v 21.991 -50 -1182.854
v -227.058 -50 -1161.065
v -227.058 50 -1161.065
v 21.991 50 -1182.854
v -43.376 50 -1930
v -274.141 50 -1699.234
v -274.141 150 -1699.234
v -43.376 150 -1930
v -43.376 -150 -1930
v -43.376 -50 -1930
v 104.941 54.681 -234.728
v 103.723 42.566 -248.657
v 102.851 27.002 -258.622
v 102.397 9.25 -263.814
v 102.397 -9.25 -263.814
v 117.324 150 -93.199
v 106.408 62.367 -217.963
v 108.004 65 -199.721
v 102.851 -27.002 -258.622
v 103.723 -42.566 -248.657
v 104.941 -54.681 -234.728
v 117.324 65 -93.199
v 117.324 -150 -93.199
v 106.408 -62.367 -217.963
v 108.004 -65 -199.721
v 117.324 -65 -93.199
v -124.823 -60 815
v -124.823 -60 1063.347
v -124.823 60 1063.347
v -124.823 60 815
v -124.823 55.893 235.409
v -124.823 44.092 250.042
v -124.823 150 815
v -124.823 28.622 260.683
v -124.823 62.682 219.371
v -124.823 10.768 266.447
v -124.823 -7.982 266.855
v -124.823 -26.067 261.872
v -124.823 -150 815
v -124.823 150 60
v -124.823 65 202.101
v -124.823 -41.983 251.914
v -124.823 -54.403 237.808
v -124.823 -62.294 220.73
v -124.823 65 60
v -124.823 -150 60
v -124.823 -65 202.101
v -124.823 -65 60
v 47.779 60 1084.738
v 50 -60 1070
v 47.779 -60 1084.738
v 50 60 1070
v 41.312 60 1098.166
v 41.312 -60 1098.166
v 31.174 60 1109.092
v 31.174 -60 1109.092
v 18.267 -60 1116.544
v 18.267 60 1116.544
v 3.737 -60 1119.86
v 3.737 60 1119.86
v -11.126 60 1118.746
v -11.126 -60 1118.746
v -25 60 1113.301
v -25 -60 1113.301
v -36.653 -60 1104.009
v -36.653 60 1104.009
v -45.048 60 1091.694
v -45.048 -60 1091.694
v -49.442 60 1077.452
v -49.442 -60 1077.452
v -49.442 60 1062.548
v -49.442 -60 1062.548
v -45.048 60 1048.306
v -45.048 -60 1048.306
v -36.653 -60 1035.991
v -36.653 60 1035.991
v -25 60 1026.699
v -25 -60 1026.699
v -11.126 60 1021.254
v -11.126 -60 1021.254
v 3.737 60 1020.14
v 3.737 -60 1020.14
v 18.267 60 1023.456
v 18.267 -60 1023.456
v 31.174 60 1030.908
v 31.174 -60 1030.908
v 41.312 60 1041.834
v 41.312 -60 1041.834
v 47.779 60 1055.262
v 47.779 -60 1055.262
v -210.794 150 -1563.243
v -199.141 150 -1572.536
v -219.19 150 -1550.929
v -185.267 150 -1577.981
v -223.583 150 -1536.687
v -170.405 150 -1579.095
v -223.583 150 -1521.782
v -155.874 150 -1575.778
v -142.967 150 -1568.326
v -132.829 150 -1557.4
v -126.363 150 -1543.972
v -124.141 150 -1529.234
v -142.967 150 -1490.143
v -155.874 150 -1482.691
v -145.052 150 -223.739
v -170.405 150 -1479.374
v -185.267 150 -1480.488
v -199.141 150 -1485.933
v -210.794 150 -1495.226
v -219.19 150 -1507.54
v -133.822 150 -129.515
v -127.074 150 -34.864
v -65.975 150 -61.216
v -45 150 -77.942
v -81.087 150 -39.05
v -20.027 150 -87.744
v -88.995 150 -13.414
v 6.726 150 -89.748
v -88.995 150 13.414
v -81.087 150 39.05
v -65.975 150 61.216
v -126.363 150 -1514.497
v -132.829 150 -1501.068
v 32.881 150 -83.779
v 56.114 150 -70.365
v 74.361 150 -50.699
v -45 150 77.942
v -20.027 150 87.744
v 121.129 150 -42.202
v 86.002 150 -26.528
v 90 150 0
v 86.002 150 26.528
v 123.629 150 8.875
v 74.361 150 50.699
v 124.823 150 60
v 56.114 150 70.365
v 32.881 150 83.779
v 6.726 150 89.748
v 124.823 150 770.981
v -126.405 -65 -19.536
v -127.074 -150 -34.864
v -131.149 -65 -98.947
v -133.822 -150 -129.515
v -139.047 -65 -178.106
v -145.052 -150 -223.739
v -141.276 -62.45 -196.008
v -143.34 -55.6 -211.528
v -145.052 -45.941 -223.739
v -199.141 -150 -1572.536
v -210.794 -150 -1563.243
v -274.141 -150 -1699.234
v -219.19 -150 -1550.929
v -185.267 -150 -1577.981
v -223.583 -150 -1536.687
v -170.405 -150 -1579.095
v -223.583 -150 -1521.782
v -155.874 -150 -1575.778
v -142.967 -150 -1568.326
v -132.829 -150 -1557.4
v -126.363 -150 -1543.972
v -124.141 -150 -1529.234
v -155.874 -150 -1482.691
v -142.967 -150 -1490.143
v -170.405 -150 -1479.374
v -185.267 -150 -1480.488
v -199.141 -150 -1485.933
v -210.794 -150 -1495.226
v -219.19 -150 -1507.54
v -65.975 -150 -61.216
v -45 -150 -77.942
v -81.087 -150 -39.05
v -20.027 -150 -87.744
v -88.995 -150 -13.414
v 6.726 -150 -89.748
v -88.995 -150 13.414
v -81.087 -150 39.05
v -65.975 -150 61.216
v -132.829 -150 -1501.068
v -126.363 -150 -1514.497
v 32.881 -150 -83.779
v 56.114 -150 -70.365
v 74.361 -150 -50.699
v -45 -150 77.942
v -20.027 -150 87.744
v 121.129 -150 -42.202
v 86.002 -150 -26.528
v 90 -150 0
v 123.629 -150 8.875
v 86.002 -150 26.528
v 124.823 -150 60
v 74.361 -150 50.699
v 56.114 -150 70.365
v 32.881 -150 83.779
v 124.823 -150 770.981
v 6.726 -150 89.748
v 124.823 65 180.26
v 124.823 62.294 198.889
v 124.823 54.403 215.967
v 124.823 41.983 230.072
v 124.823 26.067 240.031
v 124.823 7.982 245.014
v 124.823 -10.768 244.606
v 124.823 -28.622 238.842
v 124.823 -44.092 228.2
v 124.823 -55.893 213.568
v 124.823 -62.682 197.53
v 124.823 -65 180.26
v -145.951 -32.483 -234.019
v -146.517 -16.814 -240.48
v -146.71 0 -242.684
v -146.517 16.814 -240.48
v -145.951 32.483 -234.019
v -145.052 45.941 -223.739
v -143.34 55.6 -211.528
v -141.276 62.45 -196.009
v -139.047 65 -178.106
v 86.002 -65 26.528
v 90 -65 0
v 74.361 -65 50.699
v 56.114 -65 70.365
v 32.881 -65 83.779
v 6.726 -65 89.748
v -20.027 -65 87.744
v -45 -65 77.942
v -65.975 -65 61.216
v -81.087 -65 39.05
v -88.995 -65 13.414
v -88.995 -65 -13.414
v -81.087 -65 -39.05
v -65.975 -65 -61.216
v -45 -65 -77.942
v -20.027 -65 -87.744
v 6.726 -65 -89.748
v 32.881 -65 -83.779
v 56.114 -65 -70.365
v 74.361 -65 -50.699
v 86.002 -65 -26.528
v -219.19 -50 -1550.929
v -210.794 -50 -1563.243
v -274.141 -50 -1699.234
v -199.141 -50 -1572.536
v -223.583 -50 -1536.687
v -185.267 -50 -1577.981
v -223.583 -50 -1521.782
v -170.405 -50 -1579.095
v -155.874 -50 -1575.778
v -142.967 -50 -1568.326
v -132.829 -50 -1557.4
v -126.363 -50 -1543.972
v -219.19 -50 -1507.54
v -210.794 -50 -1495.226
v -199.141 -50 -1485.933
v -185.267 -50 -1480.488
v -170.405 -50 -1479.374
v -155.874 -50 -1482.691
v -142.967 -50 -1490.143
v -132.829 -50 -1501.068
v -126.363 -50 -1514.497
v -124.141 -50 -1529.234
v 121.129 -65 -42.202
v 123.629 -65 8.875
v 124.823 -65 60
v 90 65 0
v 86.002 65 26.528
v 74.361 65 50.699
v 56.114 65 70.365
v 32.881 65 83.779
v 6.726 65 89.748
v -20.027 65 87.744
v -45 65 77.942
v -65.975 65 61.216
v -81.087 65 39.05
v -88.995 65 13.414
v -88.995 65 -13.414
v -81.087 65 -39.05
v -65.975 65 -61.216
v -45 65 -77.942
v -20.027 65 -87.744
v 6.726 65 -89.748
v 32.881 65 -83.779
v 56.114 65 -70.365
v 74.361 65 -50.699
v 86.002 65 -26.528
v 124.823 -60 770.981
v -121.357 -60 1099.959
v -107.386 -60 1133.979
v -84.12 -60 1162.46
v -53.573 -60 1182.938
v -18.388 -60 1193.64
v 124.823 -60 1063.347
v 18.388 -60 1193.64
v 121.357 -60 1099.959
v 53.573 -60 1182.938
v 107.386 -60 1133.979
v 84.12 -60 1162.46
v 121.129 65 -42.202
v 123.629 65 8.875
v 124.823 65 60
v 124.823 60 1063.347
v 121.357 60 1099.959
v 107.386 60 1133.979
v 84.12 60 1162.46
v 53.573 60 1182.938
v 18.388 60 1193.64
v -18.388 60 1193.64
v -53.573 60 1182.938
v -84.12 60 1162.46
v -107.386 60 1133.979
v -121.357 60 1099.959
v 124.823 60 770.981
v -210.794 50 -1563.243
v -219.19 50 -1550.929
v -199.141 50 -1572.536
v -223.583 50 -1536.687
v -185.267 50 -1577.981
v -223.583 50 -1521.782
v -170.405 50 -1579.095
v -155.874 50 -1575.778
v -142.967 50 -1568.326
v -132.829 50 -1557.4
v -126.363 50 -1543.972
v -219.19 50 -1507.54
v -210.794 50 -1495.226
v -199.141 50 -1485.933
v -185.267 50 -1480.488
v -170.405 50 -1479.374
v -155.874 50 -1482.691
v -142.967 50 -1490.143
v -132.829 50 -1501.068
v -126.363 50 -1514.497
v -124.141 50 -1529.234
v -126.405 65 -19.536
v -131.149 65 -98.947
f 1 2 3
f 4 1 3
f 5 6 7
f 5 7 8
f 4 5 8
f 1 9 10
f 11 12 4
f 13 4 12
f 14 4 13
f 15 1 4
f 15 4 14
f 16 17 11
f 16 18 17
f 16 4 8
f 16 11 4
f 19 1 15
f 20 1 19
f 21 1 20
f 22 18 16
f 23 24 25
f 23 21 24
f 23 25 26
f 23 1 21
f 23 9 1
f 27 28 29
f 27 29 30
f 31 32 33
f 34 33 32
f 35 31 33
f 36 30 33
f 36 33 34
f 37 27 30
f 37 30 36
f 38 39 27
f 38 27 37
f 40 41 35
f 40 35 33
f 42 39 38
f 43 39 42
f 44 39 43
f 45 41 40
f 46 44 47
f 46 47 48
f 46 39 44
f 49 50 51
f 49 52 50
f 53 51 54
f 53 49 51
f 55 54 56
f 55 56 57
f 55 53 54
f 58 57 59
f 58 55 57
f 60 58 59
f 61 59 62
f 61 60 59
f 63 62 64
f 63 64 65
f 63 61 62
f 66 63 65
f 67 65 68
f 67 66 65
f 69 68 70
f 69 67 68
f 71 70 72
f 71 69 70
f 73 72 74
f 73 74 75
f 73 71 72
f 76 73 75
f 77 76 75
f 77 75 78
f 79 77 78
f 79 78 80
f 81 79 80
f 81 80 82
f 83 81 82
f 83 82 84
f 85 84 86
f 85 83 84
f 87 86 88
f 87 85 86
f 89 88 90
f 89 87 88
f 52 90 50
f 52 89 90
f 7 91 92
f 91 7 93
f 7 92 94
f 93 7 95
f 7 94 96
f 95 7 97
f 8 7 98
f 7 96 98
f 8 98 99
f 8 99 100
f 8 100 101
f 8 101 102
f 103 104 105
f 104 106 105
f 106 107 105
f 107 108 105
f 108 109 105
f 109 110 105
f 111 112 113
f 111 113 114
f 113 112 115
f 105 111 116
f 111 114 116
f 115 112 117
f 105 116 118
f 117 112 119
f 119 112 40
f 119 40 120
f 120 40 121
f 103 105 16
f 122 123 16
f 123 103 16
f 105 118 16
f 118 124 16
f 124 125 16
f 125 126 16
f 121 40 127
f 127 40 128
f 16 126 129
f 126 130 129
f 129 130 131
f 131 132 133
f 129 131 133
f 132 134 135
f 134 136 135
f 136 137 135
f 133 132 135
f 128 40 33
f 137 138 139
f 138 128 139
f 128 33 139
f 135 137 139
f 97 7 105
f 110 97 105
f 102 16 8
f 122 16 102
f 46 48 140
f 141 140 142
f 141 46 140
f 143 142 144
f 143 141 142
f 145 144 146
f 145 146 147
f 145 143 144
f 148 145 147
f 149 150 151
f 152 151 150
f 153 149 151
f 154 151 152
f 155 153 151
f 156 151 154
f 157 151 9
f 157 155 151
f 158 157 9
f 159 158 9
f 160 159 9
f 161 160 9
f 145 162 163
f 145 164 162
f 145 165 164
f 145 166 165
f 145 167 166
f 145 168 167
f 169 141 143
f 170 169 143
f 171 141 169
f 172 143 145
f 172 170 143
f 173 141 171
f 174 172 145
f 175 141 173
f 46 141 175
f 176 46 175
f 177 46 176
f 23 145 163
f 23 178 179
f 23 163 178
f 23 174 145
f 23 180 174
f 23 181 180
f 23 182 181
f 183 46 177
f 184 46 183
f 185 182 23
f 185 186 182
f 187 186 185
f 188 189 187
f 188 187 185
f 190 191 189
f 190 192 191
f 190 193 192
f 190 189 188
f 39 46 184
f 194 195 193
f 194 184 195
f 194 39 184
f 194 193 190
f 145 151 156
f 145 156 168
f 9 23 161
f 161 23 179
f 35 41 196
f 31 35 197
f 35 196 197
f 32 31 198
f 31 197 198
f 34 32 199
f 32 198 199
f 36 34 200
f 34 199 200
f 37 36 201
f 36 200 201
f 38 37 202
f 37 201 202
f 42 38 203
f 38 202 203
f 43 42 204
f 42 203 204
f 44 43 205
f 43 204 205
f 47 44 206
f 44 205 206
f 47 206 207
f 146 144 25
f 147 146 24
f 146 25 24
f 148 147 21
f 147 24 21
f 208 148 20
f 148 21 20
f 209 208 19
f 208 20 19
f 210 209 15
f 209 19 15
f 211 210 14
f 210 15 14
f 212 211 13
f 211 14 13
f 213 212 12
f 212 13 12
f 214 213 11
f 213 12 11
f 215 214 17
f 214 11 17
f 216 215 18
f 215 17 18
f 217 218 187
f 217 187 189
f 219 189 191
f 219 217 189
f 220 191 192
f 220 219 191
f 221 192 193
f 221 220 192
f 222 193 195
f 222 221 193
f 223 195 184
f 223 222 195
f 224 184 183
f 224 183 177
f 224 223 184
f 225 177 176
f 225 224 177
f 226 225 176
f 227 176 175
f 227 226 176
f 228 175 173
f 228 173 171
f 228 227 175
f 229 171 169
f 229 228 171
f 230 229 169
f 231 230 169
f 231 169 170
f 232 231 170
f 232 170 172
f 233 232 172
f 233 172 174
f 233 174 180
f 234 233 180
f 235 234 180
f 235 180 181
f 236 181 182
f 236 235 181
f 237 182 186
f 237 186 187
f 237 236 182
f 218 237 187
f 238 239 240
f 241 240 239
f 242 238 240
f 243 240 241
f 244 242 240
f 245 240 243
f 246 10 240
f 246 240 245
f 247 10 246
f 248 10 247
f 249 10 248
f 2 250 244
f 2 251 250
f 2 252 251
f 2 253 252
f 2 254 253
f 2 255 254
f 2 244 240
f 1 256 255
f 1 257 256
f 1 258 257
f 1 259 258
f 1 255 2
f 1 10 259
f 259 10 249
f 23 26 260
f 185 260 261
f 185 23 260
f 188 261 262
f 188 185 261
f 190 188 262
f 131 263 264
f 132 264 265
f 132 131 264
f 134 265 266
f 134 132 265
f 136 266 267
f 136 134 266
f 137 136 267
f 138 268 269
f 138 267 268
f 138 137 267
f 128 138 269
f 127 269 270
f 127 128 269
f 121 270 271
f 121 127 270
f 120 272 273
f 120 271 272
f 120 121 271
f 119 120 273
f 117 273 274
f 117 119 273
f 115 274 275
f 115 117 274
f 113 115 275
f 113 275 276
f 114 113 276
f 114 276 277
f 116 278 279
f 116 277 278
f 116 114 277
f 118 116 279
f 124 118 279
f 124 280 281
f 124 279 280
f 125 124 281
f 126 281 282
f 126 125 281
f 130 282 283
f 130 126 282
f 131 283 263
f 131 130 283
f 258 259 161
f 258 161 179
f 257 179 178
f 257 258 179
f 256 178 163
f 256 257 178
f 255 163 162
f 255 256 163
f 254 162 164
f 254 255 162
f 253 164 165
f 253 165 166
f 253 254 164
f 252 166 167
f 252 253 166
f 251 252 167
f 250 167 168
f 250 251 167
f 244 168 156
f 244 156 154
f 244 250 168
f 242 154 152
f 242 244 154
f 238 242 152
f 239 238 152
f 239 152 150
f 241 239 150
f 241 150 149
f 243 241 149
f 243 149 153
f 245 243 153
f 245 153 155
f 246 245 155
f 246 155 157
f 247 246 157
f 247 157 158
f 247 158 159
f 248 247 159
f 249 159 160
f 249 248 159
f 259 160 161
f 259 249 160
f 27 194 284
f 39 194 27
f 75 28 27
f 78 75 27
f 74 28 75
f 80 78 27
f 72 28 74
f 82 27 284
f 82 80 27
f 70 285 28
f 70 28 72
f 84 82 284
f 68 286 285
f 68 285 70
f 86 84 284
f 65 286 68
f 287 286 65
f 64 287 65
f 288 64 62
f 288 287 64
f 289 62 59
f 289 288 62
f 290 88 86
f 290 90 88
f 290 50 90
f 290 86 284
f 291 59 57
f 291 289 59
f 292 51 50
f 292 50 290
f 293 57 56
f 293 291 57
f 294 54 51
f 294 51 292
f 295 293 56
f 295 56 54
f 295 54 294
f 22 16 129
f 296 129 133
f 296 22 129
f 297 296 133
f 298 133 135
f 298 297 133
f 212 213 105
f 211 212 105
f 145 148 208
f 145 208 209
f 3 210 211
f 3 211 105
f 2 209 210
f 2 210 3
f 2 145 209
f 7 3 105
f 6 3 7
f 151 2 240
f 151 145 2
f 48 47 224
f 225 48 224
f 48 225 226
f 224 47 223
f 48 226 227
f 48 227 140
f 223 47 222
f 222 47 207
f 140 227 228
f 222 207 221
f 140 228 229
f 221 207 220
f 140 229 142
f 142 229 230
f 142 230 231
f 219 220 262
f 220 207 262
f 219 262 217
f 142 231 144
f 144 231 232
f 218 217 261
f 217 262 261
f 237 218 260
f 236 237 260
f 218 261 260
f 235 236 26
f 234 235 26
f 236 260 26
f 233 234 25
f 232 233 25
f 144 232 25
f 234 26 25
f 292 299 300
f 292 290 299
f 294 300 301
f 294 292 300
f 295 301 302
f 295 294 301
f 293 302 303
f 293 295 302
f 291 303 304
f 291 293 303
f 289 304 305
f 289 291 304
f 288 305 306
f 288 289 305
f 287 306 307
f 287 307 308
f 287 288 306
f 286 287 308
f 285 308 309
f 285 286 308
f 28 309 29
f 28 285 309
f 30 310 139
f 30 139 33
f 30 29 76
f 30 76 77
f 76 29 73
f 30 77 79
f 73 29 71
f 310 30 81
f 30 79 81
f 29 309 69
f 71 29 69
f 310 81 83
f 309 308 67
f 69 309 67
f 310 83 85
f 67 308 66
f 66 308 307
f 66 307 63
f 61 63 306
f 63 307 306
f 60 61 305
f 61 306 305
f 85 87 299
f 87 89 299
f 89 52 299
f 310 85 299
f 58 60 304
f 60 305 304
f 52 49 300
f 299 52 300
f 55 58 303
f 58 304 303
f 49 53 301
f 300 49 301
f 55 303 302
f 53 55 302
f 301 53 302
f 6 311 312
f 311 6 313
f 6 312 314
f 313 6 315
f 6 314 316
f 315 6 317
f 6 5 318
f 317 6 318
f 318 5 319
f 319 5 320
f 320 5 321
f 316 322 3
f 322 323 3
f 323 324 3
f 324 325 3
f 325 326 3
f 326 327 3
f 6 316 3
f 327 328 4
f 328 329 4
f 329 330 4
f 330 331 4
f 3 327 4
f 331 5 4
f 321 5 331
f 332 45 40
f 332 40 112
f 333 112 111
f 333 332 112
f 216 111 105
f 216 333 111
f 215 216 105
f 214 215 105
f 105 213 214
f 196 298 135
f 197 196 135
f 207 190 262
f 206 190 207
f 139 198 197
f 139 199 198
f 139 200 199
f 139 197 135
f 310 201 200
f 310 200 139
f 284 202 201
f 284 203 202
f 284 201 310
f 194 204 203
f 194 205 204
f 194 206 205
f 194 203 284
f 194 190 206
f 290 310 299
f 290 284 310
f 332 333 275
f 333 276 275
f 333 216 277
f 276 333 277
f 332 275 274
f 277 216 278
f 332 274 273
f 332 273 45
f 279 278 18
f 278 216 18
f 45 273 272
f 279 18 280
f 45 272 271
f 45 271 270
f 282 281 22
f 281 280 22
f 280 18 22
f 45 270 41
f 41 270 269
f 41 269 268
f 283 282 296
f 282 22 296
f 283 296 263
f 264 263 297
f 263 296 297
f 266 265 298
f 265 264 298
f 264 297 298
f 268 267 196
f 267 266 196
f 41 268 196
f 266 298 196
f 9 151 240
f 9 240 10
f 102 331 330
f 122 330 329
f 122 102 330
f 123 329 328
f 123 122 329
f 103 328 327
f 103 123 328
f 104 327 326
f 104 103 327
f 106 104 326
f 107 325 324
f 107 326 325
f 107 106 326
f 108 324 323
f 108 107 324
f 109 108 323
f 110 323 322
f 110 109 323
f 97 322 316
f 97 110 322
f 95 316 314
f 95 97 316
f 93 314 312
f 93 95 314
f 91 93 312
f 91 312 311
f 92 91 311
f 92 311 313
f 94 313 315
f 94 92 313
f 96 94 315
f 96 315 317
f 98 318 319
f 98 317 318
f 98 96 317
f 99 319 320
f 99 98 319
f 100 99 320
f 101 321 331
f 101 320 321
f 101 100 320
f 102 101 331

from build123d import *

# Parameters (mm, degrees)
F0_R     = 50
F0_R_2   = 90
F1_DEPTH = 150
F2_DEPTH = 60
F3_W     = 100
F3_H     = 750
F4_DEPTH = 502.2501499836


with BuildPart() as f1:
    # F0 (on Front) → F1 (new body, symmetric)
    with BuildSketch(Plane.XZ):
        with BuildLine():
            Line((124.8228227847, 770.9807370697), (-124.8228227847, 815))
            Line((-124.8228227847, 815), (-124.8228227847, 60))
            ThreePointArc((-124.8228227847, 60), (-129.8865626035, -82.2298063502), (-145.0521405991, -223.7393979666))
            Line((-145.0521405991, -223.7393979666), (-274.1412275364, -1699.2344133757))
            Line((-274.1412275364, -1699.2344133757), (-43.3756409121, -1930))
            Line((-43.3756409121, -1930), (117.3236608062, -93.1985763421))
            ThreePointArc((117.3236608062, -93.1985763421), (122.5424011541, -16.6712044007), (124.8228227847, 60))
            Line((124.8228227847, 60), (124.8228227847, 770.9807370697))
        make_face()
        with Locations((-174.1412275364, -1529.2344133757)):
            Circle(F0_R, mode=Mode.SUBTRACT)
        Circle(F0_R_2, mode=Mode.SUBTRACT)
    extrude(amount=F1_DEPTH, both=True)

    # F0 (on Front) → F2 (join, symmetric)
    with BuildSketch(Plane.XZ):
        with BuildLine():
            ThreePointArc((124.8228227847, 1063.346962193), (0, 1195), (-124.8228227847, 1063.346962193))
            Line((-124.8228227847, 1063.346962193), (-124.8228227847, 815))
            Line((-124.8228227847, 815), (124.8228227847, 770.9807370697))
            Line((124.8228227847, 770.9807370697), (124.8228227847, 1063.346962193))
        make_face()
        with Locations((0, 1070)):
            Circle(F0_R, mode=Mode.SUBTRACT)
    extrude(amount=F2_DEPTH, both=True)

    # F3 (on face) → F4 (cut, through all)
    with BuildSketch(Plane(origin=(124.5243372615, 0, -10.8944678435), x_dir=(0, 1, 0), z_dir=(0.9961946981, 0, -0.0871557427))):
        with BuildLine():
            Line((65, -82.6184968222), (65, 190.4526642196))
            ThreePointArc((65, 190.4526642196), (0, 255.4526642196), (-65, 190.4526642196))
            Line((-65, 190.4526642196), (-65, -82.6184968222))
            Line((-65, -82.6184968222), (65, -82.6184968222))
        make_face()
        with BuildLine():
            Line((65, -189.5473357804), (65, -82.6184968222))
            Line((65, -82.6184968222), (-65, -82.6184968222))
            Line((-65, -82.6184968222), (-65, -189.5473357804))
            ThreePointArc((-65, -189.5473357804), (0, -254.5473357804), (65, -189.5473357804))
        make_face()
        with Locations((0, -1551.4362035179)):
            Rectangle(F3_W, F3_H)
    extrude(amount=-F4_DEPTH, mode=Mode.SUBTRACT)


solid = f1.part
